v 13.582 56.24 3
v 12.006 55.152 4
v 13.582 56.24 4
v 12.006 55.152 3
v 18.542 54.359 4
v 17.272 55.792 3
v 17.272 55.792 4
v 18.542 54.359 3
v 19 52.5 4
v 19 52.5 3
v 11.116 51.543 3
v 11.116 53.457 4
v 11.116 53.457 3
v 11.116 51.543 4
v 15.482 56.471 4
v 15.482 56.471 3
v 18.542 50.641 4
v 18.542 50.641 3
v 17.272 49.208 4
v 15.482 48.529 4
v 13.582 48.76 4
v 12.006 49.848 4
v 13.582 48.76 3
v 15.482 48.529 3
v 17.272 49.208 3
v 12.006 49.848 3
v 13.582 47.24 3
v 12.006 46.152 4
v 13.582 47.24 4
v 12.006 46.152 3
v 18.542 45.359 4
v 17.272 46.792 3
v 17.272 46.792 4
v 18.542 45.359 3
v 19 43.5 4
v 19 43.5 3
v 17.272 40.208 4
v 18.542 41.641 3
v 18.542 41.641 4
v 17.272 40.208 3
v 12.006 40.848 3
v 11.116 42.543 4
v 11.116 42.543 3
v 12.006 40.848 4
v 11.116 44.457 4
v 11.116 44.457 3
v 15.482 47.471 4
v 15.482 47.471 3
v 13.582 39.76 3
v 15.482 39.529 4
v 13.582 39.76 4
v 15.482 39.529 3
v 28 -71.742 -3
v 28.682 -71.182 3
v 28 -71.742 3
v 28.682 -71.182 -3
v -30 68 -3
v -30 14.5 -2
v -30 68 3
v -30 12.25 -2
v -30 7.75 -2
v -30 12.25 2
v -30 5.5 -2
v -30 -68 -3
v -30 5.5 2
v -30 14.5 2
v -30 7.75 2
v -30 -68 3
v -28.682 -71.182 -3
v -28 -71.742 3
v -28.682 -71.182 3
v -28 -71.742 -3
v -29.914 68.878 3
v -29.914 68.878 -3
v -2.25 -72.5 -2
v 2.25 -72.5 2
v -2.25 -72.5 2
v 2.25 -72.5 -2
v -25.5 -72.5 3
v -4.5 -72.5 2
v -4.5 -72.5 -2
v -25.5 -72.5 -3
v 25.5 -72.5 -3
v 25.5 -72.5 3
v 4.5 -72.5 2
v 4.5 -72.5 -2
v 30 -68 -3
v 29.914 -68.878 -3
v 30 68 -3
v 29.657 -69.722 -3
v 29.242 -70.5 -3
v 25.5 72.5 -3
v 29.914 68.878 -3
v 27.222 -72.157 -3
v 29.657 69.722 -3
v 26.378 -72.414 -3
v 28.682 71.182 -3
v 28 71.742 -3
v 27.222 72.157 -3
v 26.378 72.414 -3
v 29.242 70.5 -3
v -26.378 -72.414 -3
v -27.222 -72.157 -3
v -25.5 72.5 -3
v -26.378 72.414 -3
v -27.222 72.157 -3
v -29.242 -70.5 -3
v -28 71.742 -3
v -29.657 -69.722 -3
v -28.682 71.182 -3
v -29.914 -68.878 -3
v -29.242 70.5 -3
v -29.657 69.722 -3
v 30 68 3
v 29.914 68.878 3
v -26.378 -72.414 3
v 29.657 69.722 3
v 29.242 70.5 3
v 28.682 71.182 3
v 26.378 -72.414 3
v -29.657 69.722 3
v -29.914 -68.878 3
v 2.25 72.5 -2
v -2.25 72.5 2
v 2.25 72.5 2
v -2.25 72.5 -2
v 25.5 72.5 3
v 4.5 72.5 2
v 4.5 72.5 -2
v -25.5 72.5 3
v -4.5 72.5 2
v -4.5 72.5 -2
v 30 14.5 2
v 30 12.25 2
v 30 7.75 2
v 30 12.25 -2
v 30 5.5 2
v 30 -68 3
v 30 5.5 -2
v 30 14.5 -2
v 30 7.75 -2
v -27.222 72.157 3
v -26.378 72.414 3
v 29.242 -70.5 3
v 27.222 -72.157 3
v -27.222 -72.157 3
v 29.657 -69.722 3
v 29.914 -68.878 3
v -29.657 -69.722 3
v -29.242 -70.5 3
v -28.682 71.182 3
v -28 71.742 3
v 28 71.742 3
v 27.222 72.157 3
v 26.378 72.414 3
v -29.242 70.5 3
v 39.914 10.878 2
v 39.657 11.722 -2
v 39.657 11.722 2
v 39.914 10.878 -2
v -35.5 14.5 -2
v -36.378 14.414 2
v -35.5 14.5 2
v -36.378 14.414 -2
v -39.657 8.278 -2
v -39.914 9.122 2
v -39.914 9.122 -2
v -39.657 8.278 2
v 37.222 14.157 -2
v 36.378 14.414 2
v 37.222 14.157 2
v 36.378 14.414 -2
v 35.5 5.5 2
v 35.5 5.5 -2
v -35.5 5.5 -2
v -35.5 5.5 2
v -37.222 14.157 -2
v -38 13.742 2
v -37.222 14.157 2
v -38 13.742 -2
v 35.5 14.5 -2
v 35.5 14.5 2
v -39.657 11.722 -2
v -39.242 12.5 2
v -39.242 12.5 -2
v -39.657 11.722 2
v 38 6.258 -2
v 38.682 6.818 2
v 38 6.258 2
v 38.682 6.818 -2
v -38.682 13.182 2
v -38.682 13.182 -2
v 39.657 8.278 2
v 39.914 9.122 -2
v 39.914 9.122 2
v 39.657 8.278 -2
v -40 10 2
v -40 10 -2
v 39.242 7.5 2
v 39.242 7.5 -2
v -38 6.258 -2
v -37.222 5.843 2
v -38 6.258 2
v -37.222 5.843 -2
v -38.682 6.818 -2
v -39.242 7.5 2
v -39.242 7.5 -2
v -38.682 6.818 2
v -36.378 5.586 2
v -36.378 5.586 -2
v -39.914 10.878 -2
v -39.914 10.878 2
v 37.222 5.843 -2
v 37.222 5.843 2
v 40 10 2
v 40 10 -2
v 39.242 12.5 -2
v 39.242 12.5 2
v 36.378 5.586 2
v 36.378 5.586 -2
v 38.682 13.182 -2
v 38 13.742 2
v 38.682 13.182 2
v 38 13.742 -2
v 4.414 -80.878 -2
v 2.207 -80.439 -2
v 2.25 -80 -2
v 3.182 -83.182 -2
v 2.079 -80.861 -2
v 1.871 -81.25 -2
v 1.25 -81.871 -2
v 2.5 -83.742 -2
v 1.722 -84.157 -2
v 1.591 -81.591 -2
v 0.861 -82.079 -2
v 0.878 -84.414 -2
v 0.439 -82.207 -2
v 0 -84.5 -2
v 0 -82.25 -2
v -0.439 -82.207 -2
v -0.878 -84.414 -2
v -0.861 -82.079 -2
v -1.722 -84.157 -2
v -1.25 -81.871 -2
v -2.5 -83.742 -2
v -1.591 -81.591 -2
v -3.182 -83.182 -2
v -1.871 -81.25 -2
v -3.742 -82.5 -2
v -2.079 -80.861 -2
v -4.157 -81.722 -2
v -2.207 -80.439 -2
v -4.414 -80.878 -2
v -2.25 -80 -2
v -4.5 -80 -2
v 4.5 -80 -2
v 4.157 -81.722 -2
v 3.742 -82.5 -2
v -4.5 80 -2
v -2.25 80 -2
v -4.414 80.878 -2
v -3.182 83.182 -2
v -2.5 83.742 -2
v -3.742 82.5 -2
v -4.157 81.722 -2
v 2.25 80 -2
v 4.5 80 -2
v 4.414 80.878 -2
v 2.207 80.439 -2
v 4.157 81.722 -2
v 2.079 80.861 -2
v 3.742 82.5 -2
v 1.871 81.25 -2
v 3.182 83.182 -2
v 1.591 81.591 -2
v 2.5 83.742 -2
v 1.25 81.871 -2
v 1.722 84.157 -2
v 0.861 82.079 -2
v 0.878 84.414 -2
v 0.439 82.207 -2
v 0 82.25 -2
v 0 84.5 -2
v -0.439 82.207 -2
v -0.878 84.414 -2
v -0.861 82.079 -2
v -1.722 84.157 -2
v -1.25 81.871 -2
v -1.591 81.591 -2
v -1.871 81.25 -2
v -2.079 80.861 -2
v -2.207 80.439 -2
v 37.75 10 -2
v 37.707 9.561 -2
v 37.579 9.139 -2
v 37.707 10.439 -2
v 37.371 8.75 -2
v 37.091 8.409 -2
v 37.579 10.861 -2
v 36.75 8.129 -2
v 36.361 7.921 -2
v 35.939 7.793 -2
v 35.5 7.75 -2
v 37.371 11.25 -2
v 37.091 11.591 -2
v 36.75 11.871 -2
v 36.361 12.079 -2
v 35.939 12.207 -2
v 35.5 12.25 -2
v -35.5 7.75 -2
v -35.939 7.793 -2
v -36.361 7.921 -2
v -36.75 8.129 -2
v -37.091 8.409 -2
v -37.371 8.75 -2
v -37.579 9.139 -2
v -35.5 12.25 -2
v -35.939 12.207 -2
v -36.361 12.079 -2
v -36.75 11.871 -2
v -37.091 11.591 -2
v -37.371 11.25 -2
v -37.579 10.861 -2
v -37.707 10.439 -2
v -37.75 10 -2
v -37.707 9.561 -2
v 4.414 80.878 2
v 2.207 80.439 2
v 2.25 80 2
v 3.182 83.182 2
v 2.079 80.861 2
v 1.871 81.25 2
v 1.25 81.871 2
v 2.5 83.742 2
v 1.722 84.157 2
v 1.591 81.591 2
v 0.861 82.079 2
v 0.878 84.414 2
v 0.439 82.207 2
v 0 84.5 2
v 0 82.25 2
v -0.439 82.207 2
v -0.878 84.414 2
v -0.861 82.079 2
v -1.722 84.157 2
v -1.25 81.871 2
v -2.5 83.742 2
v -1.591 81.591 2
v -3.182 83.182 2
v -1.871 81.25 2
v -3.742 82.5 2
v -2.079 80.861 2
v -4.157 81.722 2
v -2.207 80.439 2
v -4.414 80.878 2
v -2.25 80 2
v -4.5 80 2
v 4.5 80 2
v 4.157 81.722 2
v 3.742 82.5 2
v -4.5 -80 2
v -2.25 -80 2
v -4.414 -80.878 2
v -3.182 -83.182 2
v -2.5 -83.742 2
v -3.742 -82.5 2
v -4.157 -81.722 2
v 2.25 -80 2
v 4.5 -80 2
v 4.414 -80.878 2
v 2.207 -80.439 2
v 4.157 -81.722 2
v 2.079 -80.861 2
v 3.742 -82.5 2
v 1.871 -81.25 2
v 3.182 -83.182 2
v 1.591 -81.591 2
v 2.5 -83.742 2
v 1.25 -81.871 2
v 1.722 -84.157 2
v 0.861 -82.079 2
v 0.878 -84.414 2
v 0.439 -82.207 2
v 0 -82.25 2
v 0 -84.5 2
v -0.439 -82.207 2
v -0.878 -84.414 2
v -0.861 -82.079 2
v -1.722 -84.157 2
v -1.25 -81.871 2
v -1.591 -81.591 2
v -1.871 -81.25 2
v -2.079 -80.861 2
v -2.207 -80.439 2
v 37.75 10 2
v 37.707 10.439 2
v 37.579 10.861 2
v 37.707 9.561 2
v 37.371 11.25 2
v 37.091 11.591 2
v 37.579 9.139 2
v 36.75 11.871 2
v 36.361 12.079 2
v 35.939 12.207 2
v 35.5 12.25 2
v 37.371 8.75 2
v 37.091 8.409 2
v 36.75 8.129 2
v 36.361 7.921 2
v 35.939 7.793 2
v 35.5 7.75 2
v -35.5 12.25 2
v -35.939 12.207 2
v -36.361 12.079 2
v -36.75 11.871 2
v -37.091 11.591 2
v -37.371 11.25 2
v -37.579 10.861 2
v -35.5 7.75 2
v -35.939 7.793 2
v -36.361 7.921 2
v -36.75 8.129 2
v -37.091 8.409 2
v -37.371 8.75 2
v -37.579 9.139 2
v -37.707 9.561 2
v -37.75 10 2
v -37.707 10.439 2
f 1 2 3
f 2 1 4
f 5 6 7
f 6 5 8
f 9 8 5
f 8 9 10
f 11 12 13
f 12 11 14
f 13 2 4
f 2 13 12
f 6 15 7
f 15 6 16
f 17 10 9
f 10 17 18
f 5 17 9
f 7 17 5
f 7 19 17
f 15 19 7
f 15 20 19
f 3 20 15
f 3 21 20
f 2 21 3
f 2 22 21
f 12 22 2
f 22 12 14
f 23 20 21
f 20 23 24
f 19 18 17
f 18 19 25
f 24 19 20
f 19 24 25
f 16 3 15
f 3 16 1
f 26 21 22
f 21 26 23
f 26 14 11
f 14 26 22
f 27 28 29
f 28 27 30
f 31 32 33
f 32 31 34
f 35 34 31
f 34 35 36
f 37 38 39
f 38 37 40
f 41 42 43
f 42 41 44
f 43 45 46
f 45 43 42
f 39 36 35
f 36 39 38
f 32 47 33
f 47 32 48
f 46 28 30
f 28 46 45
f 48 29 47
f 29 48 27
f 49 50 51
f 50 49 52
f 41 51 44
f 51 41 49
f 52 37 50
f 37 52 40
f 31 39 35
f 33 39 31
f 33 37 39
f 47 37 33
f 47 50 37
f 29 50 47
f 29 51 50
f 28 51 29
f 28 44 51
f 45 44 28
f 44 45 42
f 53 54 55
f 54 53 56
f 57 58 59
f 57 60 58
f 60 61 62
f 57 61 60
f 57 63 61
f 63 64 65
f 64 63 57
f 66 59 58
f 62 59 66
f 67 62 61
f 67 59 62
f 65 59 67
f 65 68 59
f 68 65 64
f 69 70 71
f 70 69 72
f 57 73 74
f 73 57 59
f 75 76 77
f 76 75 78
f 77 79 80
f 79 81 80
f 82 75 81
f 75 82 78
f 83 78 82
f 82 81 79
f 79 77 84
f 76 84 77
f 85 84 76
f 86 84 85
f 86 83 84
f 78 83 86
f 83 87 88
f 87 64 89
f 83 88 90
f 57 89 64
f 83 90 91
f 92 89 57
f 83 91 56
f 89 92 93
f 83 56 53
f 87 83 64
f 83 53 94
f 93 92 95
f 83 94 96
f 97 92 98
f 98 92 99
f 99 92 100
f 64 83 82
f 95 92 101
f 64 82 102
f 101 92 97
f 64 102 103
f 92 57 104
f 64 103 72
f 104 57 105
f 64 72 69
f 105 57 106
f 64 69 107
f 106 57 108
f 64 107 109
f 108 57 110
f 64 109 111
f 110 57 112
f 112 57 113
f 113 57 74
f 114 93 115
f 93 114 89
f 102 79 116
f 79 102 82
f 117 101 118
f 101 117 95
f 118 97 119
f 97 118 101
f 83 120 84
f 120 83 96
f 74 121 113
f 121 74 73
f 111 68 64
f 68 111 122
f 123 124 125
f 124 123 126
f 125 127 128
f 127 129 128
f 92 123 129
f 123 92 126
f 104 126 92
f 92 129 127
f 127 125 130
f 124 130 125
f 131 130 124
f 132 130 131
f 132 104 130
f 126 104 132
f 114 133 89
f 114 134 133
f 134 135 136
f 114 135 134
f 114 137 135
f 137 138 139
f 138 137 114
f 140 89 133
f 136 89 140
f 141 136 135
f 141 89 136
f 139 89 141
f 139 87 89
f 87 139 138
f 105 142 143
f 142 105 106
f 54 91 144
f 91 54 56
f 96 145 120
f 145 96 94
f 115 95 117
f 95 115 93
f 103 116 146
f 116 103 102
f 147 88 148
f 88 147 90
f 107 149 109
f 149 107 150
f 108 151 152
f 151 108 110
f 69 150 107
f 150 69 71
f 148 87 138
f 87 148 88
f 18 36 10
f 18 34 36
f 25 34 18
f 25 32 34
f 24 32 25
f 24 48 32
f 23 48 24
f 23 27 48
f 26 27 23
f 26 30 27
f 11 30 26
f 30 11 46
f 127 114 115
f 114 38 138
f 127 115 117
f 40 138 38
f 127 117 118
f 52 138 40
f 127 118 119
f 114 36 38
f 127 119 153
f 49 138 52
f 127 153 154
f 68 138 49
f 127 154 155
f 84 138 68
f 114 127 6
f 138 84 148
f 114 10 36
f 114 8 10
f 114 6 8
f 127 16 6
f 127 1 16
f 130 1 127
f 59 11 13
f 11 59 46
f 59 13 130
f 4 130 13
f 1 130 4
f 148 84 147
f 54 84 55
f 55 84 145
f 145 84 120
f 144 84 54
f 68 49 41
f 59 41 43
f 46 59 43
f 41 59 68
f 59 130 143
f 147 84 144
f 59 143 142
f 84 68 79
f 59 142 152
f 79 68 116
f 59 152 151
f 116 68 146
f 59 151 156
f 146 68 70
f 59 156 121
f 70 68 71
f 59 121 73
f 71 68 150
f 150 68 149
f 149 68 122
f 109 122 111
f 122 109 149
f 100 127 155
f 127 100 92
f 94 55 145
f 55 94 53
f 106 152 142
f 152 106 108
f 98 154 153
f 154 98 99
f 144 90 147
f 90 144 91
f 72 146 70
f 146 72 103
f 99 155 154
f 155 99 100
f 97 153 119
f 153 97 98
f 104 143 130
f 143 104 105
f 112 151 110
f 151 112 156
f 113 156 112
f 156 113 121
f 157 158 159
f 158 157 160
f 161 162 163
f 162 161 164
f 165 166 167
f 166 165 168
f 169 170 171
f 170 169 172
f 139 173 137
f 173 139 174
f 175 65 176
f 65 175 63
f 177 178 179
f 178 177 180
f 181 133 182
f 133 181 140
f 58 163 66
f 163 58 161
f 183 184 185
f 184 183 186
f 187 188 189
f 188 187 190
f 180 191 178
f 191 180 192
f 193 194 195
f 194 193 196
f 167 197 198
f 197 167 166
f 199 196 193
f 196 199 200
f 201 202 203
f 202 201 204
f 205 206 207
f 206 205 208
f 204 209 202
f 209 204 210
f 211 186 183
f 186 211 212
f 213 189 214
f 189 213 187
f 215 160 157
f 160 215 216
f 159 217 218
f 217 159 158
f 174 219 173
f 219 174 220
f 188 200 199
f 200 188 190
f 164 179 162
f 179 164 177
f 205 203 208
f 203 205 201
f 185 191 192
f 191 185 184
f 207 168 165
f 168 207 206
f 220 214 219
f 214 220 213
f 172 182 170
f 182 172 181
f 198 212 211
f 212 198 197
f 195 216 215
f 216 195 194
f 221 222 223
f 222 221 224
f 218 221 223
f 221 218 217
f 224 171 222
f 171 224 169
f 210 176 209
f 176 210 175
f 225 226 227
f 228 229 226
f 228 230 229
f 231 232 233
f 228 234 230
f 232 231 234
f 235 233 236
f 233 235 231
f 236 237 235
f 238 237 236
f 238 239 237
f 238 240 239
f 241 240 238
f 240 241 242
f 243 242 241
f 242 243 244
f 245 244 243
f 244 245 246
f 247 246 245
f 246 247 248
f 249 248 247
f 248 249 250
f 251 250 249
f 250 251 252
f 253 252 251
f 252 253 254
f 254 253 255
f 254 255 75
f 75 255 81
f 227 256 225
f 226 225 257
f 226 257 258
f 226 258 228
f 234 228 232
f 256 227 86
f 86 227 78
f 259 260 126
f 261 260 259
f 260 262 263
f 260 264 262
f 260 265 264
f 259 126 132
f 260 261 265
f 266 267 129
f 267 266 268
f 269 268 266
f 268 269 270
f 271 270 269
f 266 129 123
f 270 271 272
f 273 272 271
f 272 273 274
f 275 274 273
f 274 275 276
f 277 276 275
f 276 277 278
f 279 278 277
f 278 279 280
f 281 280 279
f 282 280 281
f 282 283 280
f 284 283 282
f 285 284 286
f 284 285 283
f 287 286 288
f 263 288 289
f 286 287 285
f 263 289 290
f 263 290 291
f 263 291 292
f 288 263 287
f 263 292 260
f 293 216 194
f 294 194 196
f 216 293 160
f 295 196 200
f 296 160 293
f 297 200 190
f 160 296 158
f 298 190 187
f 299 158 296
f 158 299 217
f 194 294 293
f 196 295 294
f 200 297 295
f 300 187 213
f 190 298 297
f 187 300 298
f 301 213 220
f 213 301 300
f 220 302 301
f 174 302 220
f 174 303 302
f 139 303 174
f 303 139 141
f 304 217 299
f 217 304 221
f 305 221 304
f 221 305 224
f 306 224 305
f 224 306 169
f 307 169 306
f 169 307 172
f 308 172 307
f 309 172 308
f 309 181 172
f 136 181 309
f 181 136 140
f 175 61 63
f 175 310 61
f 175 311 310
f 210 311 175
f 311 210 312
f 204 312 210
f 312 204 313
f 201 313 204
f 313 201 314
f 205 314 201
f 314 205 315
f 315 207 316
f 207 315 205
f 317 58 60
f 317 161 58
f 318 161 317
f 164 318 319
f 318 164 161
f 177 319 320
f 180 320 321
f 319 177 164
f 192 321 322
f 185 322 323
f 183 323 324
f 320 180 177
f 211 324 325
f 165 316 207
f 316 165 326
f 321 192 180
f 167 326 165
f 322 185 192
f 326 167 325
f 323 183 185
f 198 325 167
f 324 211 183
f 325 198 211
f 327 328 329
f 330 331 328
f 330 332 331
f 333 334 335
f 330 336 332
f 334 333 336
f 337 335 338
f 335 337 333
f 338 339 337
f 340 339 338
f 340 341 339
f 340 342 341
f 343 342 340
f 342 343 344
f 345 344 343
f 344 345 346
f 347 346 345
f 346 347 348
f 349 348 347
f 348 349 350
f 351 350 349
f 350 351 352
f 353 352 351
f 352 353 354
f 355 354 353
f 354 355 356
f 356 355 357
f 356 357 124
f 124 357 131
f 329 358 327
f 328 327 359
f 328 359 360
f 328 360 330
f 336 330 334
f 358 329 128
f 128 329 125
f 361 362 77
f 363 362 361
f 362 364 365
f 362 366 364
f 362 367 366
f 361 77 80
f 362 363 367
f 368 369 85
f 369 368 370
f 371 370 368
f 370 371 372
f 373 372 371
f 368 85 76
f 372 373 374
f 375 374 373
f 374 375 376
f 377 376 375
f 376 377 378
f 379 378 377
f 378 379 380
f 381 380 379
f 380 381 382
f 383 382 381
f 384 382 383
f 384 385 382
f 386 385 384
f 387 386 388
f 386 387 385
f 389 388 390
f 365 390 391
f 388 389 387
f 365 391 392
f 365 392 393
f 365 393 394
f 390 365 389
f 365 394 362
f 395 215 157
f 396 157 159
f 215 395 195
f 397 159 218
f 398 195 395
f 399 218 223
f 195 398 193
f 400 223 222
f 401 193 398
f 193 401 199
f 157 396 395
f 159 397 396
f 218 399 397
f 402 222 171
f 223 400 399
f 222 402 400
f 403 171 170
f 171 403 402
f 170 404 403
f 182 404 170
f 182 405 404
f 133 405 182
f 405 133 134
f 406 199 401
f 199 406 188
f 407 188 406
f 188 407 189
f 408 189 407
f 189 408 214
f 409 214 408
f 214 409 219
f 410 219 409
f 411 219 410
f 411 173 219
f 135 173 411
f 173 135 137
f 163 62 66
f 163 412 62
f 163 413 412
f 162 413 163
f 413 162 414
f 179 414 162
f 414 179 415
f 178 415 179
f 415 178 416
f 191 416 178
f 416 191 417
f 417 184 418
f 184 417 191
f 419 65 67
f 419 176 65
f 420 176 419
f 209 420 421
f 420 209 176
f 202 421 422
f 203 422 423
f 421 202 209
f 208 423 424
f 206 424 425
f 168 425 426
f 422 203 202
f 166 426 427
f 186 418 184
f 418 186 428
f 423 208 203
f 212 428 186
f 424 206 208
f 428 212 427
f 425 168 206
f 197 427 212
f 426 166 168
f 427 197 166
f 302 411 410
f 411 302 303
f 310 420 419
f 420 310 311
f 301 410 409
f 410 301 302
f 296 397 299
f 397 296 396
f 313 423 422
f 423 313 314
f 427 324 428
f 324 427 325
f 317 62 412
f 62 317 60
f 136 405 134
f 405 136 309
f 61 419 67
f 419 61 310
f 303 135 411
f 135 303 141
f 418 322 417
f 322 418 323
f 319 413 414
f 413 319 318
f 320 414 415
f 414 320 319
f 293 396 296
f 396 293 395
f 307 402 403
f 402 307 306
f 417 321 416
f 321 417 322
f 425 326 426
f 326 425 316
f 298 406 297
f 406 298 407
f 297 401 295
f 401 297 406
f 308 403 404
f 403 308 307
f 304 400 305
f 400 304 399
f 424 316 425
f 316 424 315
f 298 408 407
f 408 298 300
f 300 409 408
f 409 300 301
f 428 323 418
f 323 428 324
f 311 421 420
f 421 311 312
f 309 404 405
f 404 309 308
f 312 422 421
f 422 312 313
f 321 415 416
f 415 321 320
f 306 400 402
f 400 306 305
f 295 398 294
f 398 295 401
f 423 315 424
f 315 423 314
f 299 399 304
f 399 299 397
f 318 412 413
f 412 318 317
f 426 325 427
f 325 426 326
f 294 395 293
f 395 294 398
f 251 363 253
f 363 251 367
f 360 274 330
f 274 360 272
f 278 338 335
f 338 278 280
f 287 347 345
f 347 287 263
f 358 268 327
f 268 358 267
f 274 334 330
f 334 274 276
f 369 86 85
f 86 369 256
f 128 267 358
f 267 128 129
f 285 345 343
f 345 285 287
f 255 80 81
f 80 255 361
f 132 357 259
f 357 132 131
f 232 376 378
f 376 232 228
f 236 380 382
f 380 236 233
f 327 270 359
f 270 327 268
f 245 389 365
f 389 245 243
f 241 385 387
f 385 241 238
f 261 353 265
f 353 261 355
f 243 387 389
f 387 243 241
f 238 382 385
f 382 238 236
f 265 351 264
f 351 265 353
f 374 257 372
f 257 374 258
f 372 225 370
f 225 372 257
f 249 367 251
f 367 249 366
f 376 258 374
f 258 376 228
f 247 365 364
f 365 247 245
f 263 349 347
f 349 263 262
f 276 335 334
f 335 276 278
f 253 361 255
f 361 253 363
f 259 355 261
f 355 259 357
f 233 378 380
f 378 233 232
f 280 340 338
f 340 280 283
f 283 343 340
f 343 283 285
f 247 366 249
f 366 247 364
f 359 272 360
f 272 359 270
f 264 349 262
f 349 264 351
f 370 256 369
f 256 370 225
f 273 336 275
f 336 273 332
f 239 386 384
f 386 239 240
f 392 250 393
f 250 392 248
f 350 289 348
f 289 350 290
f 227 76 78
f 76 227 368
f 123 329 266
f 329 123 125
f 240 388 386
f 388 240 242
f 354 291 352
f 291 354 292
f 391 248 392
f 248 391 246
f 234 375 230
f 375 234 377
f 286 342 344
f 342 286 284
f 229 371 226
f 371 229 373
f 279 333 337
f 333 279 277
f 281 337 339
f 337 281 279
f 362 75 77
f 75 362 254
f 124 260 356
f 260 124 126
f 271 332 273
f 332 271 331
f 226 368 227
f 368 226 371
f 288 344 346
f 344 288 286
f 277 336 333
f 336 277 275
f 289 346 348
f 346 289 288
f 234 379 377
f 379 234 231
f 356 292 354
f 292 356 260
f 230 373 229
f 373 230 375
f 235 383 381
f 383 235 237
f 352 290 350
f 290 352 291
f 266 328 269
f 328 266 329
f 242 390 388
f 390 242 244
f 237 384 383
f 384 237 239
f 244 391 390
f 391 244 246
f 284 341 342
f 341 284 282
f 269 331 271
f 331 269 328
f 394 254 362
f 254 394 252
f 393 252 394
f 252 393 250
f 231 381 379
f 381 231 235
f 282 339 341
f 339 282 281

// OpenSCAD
// file: holder.scad
len_phone = 145;
d_screw_m4 = 4.5;
width_phone = 56;
thikness_holder = 4;
thikness_phone = 8;
append = 15;
corner_round = 8;
w_grip = 30;

//holder_set();
//vertical_block(len_phone);
rotate([0, 180, 0]);
grip();

module grip() {
    difference() {
        grip_base();
        color("red")
        translate([0, w_grip/2, thikness_phone])
        cube([w_grip+1, w_grip, 2*thikness_phone], center=true);
        translate([0, -w_grip/4, 0])
        cylinder(d=d_screw_m4, 3*thikness_phone, center=true, $fn=32);
    }
}


module grip_base() {
    hull() {
        translate([w_grip/2-corner_round/2, -w_grip/2, 0])
        cylinder(d=corner_round, 2*thikness_phone, center=true);
        translate([-w_grip/2+corner_round/2, -w_grip/2, 0])
        cylinder(d=corner_round, 2*thikness_phone, center=true);
        translate([w_grip/2-corner_round/2, w_grip/2, 0])
        cylinder(d=corner_round, 2*thikness_phone, center=true);
        translate([-w_grip/2+corner_round/2, w_grip/2, 0])
        cylinder(d=corner_round, 2*thikness_phone, center=true);
    }
}


module horizontal_block(len_block, offset_vertical) {
    len_block = len_block + append;
    
    translate([0, offset_vertical, 0])
    cylinder(d=20, h=thikness_holder, center=true, $fn=32);
    
    difference() {
        hull() {
            translate([len_block/2, offset_vertical, 0])
            cylinder(d=9, h=thikness_holder, center=true, $fn=32);
            
            translate([-len_block/2, offset_vertical, 0])
            cylinder(d=9, h=thikness_holder, center=true, $fn=32);
        }
        color("red")
        hull() {
            translate([len_block/2, offset_vertical, 0])
            cylinder(d=d_screw_m4, h=thikness_holder+2, center=true, $fn=32);
            
            translate([-len_block/2, offset_vertical, 0])
            cylinder(d=d_screw_m4, h=thikness_holder+2, center=true, $fn=32);
        }
    }
}


module vertical_block(len_block) {
    len_block = len_block + append;
    
        difference() {
            hull() {
                //translate([0, -len_phone/2, 0])
                translate([0, -len_block/2, 0])
                cylinder(d=9, h=thikness_holder, center=true, $fn=32);
                
                //translate([0, -len_phone/2, 0])
                translate([0, len_block/2, 0])
                cylinder(d=9, h=thikness_holder, center=true, $fn=32);
            }
            color("red")
            hull() {
                //translate([0, -len_phone/2, 0])
                translate([0, -len_block/2, 0])
                cylinder(d=d_screw_m4, h=thikness_holder+2, center=true, $fn=32);
                
                //translate([0, -len_phone/2, 0])
                translate([0, len_block/2, 0])
                cylinder(d=d_screw_m4, h=thikness_holder+2, center=true, $fn=32);
        }
    }
}

module holder_set() {
    horizontal_block(len_block=width_phone, offset_vertical=10);
    vertical_block(len_block=len_phone);
}
// file: smartphone.scad
echo("Работа Алексея Коротких!");
len_phone = 145;
width_phone = 60;
thickness_phone = 6;
corner_round = 9;

smartphone();



module smartphone() {
    smartphone_block();
    cameras_block();
}

module cameras_block() {
    color("blue")
    translate([width_phone/2-15, len_phone/2-20, 0])
    cylinder(d=8, h = thickness_phone/2+1);

    color("blue")
    translate([width_phone/2-15, len_phone/2-29, 0])
    cylinder(d=8, h = thickness_phone/2+1);
}

module smartphone_block() {
    hull() {
        translate([width_phone/2-corner_round/2, len_phone/2-corner_round/2, 0])
        cylinder(h=thickness_phone, d=corner_round, $fn=32, center=true);
        
        mirror([1, 0, 0])
        translate([width_phone/2-corner_round/2, len_phone/2-corner_round/2, 0])
        cylinder(h=thickness_phone, d=corner_round, $fn=32, center=true);
        
        mirror([0, 1, 0])
        translate([width_phone/2-corner_round/2, len_phone/2-corner_round/2, 0])
        cylinder(h=thickness_phone, d=corner_round, $fn=32, center=true);
        
        mirror([1, 0, 0])
        mirror([0, 1, 0])
        translate([width_phone/2-corner_round/2, len_phone/2-corner_round/2, 0])
        cylinder(h=thickness_phone, d=corner_round, $fn=32, center=true);
    }
}
// main file
use <smartphone.scad>
use <holder.scad>
    
echo ("Работа Алексея Коротких!");
smartphone();
holder_set();
